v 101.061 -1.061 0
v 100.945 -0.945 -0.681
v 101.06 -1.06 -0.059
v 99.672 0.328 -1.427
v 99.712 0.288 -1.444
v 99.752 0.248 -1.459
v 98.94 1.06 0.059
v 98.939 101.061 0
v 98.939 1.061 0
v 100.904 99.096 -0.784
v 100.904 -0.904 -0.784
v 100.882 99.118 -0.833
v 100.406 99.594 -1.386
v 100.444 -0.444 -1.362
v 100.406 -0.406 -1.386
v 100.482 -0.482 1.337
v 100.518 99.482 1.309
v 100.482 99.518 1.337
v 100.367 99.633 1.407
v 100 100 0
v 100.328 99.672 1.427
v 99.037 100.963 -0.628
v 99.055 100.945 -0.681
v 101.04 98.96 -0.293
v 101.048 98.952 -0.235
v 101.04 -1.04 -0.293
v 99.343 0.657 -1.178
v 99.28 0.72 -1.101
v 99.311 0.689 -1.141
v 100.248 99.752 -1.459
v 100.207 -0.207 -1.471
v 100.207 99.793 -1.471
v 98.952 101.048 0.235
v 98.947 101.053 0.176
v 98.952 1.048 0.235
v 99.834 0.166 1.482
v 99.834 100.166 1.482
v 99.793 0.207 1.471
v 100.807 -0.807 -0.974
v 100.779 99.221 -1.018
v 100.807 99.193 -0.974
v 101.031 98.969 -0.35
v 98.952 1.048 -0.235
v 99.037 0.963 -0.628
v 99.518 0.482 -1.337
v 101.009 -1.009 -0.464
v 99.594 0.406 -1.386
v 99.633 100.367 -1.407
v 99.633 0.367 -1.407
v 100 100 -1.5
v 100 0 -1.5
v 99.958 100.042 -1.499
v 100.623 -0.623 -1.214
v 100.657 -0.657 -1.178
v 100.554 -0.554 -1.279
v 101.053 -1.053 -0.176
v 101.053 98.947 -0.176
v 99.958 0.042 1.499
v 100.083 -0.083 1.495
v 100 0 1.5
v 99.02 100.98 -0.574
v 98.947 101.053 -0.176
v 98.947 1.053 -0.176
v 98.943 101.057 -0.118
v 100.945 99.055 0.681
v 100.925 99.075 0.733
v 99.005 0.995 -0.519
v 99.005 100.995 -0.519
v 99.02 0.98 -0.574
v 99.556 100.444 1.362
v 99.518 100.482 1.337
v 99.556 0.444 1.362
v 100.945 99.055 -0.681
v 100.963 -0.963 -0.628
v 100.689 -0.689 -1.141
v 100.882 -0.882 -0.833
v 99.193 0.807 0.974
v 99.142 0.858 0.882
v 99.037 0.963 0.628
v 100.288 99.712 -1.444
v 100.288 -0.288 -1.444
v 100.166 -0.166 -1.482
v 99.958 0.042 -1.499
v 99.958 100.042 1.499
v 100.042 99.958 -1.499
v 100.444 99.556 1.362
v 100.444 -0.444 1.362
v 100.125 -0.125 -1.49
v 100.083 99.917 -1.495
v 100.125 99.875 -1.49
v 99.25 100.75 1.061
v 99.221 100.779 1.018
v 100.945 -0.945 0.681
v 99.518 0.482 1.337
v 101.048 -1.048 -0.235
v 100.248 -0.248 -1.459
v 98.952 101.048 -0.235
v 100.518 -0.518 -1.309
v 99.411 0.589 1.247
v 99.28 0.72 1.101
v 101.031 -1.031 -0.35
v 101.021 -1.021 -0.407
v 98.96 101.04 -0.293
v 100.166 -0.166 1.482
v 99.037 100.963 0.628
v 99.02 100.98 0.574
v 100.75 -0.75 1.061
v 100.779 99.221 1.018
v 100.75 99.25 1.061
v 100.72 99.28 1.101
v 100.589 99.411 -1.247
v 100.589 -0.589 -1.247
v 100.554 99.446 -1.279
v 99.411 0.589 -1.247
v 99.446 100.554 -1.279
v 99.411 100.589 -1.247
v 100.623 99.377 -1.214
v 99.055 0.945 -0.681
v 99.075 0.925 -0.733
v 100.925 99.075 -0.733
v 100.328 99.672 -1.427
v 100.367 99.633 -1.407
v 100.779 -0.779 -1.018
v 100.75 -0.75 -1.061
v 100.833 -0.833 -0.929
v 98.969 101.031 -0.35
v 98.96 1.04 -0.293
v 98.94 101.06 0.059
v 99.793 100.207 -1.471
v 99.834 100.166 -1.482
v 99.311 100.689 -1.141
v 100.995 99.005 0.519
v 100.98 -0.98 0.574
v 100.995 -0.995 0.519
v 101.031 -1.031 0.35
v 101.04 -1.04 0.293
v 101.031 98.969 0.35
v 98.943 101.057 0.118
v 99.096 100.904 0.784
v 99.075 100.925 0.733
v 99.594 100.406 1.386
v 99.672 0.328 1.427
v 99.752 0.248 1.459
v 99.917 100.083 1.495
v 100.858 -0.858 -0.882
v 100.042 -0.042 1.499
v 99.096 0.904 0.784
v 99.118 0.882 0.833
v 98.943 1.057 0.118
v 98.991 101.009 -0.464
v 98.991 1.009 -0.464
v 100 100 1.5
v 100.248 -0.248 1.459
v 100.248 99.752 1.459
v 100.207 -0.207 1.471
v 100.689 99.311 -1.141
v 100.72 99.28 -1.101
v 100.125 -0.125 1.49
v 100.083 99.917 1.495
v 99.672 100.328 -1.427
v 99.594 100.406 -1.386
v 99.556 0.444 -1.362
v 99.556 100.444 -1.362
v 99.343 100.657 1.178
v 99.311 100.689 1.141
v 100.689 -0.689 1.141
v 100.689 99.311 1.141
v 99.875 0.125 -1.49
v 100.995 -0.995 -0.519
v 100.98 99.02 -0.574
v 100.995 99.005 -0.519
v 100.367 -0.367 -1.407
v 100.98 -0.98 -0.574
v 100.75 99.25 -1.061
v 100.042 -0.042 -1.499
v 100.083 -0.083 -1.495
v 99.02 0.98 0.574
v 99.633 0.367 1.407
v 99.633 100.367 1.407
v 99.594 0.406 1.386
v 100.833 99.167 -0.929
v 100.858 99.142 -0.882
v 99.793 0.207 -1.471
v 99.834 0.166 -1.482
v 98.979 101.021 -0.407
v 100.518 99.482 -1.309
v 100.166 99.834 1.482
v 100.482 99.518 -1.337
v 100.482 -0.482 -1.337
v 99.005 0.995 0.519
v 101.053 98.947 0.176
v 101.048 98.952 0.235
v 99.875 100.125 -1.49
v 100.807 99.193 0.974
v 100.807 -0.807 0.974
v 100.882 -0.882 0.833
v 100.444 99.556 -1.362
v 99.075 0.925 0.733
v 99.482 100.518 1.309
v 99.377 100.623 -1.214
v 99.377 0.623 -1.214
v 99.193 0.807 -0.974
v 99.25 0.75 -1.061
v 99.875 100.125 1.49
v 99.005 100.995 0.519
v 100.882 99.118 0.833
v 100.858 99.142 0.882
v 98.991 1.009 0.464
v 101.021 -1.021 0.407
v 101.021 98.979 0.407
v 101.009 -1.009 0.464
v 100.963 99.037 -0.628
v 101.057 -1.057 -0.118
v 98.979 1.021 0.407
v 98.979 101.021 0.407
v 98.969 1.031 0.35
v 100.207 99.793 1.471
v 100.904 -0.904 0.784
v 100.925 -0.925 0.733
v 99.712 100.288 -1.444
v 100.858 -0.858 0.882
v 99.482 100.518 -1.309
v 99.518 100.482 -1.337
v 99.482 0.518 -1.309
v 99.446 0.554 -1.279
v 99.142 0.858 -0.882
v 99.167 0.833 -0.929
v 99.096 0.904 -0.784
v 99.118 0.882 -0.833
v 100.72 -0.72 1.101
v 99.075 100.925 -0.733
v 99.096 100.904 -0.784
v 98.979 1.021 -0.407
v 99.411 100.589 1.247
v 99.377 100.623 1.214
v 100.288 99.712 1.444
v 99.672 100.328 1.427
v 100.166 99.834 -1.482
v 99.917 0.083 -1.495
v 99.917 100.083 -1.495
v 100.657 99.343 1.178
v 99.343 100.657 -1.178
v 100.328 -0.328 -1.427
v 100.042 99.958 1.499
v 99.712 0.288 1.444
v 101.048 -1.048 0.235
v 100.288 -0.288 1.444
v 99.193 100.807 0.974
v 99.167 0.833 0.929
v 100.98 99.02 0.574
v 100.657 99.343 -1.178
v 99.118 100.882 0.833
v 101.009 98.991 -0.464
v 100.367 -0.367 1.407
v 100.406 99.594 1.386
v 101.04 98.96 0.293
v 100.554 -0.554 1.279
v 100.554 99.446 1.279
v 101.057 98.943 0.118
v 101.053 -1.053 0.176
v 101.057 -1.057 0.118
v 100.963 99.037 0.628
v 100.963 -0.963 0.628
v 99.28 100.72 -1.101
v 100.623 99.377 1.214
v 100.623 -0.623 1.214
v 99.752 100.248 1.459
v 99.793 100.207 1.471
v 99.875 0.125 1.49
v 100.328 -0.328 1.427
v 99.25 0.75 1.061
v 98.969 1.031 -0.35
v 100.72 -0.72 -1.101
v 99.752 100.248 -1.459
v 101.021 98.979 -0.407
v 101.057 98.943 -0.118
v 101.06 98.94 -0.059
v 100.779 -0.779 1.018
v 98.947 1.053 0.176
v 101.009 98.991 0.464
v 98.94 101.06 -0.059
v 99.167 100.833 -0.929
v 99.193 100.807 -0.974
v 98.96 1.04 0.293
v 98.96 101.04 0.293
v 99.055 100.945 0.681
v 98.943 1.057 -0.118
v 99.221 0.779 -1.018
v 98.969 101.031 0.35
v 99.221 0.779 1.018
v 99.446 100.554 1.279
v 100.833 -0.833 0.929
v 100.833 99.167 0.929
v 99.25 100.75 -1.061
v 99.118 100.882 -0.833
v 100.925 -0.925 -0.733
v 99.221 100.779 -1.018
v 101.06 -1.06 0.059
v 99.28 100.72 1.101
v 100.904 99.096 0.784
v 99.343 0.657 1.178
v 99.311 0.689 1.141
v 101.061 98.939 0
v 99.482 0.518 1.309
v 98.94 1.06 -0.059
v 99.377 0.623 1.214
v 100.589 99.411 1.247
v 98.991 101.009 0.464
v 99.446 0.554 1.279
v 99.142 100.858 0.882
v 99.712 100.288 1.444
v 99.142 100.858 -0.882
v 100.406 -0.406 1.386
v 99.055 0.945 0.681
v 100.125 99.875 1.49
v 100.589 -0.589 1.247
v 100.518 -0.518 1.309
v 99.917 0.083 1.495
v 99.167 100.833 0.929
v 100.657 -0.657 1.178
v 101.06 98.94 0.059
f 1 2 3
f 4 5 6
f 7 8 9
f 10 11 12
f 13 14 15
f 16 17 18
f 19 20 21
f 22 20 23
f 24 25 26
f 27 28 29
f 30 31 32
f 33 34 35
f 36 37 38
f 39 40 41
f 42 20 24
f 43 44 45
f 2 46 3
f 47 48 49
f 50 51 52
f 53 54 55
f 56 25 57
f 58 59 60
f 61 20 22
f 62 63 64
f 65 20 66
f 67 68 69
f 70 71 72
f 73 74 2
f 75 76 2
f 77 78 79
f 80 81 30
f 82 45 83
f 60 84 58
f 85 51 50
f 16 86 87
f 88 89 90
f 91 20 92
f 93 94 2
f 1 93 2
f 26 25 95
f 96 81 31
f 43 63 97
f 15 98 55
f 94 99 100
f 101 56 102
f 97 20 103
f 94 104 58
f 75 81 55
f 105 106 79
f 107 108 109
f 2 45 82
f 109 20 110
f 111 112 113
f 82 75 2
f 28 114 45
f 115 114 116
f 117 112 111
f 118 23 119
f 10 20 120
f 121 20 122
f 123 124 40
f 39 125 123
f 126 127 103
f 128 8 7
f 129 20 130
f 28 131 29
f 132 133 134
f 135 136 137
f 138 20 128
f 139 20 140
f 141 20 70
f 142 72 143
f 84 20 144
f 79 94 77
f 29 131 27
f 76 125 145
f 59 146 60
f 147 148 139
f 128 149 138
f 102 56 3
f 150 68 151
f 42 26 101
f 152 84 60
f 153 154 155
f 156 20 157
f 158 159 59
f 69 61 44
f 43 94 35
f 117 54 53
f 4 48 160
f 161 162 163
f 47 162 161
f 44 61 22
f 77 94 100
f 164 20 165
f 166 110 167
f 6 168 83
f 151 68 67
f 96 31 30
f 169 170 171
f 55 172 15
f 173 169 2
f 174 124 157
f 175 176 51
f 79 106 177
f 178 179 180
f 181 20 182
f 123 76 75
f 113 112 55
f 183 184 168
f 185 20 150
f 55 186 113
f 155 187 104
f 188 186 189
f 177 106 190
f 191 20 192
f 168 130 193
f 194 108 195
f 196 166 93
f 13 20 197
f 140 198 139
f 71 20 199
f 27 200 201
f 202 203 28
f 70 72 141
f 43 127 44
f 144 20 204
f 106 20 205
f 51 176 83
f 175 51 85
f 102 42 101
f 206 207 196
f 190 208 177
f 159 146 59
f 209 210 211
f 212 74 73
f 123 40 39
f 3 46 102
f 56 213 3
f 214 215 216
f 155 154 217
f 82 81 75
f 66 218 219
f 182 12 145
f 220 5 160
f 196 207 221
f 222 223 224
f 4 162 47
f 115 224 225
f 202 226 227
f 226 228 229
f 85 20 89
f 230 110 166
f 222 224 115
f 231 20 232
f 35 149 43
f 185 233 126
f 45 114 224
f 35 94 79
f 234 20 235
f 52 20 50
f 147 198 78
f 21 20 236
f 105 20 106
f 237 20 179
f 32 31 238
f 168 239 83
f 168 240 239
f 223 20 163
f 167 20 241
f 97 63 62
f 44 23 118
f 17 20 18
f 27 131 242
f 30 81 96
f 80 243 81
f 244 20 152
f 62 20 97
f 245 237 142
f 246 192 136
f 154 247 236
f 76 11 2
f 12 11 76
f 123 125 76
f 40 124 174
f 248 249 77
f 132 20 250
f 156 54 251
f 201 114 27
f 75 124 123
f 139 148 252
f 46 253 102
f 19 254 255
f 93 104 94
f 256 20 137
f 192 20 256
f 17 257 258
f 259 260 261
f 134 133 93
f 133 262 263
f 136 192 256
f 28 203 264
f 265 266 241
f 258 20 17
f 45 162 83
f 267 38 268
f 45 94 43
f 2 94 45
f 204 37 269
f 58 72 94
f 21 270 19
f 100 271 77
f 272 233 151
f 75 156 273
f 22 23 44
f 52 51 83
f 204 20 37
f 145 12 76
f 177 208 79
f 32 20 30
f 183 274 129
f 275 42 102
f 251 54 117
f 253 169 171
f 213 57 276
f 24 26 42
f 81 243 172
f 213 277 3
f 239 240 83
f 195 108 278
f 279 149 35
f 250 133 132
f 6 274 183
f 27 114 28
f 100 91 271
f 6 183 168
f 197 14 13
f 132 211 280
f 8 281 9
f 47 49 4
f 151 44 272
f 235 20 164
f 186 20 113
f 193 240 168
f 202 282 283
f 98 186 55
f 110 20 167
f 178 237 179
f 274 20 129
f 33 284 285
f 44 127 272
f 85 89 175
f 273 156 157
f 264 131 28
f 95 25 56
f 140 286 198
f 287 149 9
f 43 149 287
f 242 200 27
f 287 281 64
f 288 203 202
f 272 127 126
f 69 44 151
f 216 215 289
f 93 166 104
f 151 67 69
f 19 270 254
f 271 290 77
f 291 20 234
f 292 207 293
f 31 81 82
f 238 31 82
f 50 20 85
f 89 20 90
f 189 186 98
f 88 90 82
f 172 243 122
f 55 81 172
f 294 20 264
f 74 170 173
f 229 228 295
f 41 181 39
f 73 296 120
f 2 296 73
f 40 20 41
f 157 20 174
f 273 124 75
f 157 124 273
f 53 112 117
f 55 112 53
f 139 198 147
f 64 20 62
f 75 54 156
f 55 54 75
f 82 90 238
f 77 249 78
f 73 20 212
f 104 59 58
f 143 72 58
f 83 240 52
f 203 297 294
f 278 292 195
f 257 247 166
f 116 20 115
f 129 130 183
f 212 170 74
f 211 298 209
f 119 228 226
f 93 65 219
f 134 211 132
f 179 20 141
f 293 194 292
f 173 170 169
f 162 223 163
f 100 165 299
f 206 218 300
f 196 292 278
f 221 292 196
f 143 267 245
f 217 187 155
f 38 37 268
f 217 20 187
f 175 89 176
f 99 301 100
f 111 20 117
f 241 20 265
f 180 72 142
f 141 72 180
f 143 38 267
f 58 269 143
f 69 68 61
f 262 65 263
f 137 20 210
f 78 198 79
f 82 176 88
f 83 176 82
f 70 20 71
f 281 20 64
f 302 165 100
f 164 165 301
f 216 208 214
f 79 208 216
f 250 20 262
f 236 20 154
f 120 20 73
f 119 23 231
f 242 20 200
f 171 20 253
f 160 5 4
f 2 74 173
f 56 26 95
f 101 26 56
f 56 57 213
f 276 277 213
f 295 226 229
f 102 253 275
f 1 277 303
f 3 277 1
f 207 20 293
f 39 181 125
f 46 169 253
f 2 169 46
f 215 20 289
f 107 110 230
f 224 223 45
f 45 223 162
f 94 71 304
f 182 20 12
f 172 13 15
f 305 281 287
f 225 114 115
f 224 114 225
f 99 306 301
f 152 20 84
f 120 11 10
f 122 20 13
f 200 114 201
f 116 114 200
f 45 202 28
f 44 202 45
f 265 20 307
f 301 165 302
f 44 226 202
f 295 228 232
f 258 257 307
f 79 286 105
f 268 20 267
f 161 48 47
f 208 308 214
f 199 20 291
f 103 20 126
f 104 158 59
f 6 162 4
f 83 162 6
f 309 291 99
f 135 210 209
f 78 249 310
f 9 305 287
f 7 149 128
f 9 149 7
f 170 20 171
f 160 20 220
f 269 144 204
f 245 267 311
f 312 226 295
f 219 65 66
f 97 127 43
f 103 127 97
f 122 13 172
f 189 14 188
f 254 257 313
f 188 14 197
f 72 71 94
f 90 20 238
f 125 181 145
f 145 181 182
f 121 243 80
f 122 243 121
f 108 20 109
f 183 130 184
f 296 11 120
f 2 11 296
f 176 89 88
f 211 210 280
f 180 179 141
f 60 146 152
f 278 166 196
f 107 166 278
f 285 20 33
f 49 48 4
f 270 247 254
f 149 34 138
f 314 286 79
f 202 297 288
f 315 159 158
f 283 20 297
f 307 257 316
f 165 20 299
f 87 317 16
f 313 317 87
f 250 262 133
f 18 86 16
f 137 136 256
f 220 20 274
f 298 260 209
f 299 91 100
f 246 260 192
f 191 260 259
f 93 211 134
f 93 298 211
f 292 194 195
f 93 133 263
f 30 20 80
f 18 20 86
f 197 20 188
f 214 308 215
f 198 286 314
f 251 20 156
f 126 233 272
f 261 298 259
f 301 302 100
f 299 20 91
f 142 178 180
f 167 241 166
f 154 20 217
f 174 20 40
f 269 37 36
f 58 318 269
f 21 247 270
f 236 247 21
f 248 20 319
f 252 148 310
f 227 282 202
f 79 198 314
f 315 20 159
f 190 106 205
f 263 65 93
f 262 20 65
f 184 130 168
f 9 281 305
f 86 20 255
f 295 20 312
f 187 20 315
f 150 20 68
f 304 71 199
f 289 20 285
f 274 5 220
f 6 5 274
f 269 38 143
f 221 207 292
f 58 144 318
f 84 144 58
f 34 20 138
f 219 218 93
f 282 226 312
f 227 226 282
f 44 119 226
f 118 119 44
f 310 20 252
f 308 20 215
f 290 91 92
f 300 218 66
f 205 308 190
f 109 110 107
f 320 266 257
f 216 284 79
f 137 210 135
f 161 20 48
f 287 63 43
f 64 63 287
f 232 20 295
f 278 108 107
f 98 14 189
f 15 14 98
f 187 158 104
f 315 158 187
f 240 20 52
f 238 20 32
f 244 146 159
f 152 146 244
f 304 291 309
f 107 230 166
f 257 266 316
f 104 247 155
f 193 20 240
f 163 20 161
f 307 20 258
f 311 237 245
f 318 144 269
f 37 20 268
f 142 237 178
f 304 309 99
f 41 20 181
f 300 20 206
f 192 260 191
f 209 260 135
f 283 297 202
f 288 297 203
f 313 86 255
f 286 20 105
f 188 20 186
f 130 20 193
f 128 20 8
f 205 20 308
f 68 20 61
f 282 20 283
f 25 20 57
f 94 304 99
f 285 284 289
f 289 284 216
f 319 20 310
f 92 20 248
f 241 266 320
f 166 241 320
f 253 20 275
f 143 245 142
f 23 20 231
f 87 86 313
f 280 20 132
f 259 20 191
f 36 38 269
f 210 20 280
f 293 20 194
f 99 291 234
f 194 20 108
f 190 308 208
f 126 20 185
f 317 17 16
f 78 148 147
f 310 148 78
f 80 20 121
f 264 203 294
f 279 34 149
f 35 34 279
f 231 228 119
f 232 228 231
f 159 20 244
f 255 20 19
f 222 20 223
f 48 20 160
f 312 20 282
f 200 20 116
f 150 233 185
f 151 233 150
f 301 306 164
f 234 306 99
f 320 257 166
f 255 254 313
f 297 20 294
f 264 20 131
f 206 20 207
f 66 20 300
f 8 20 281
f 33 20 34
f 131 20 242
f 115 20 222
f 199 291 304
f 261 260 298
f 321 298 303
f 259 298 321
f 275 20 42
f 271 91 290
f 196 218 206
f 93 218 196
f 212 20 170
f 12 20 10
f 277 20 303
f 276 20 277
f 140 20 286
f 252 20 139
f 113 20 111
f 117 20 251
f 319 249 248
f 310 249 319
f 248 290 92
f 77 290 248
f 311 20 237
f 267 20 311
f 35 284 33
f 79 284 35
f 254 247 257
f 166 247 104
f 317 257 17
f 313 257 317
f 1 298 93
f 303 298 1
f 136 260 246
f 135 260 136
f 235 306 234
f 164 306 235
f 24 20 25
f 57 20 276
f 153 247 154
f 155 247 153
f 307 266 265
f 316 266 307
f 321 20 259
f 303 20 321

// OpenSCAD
// file: syms.scad
module symY(t) {
    translate(t)
        children();
    mirror([0,1,0])
        translate(t)
            children();
}
module symX(t) {
    translate(t)
        children();
    mirror([1,0,0])
        translate(t)
            children();
}

module symZ(t) {
    translate(t)
        children();
    mirror([0,0,1])
        translate(t)
            children();
}

module	symXY(t) {
	tx=t[0];
	ty=t[1];
	tz=t[2];
	symX([tx,0,0])
	symY([0,ty,tz])
		children();
}
// main file
use <syms.scad>

mode="defc";
render=(mode=="def") && false;


eps=1e-4;
$fn=render ? 16 : 4;   // line detail
M=100;  // object scale
N=M/(50/8)/2;   // number of lines
S=render ? 4*N : 4*N;   // line detail

W=3;

module mySphere() {
    color([1,0,0])
    sphere(d=W);
}


// maps 0:1 to 0:1 but with more detail near 0 and 1
function s(v) = (cos(v*180+180)+1)/2;

// maps 2d points onto a "hill" alike thing; also distorts y a little bit
function f(v) = ([
    v[0],v[1]+pow((1-v[0]*v[0])*v[1],1),
    pow((1-v[0]*v[0])*v[1],.25)
] );


// calculates a vector in the given dir (0=x axis)
function v3r(d) = [ cos(d), sin(d), 0 ];

// maps points to a non-perpicular axis position
function g(v3) = 
 v3 *[ v3r(0),
  v3r(90),
  [ 0,0,1]
]* M;

module cx(a,b,D) {
    for(i=[0:1:S-1]) {
        x=s((i+0.0)/S);
        y=s((i+1.0)/S);
        hull() {
            translate(g(f(x*a+(1-x)*b),D))
            children();
            translate(g(f(y*a+(1-y)*b),D))
            children();
        }
    }
}

module dx(u0,u1,v0,v1,n,D,Q) {
    for(i=[0:n]) {
        j=(n-i);
        cx(u0*j/n+u1*i/n, v0*i/n+v1*j/n+Q,D) {
                mySphere();
        }

    }
}

module fx(n,m) {
    u0=[-1,0,0];
    u1=[1,0,0];
    v0=[0,0,0];
    v1=[0,1,0];

    for(i=[0:n]) {
        j=(n-i);
        z=u0*i/n+u1*j/n;
        cx(z+v0,z+v1,[0,90]) {
                mySphere();
        }
    }
    
    for(i=[0:m]) {
        j=(m-i);
        z=v0*i/m+v1*j/m;
        cx(z+u0,z+u1,[0,90]) {
                mySphere();
        }
    }
    
}

//fx(2*N,2*N);




K=5;

module foot() {
    hull() {
        R=K/M;
        translate(g([-1,0,0]))
            mySphere();
        translate(g([-1,R,0]))
            mySphere();
        translate(g([1,0,0]))
            mySphere();
        translate(g([1,R,0]))
            mySphere();
    }

    symX()
    hull() {
        R=K/M;
        translate(g([-1,1,0]))
            mySphere();
        translate(g([-1,0,0]))
            mySphere();
        translate(g([-1+R,1,0]))
            mySphere();
        translate(g([-1+R,0,0]))
            mySphere();
    }
}

//echo(g(f([0,1,0])));



//foot();


a=[ g([0,0,0]), g([1,0,0]),g([1,1,0]), g([2,1,0]) ];

function unit(v) = norm(v)>0 ? v/norm(v) : undef; 

function transpose(m) = // m is any rectangular matrix of objects
  [ for(j=[0:len(m[0])-1]) [ for(i=[0:len(m)-1]) m[i][j] ] ];

function m33tom44(m,p=[0,0,0]) = [
    concat(m[0], p[0]),
    concat(m[1], p[1]),
    concat(m[2], p[2]),
    [0,0,0,1],
];
// "invents" a matrix for which the given axis is the Z axis
function buildMatForZ(z) = [
    unit(cross(z,[0,0,1])),
    unit(cross(z,cross(z,[0,0,1]))),
    unit(z)
];


function computePointMatrix(p0,p1,p2) =
    m33tom44(transpose(buildMatForZ(p2-p0)),p1);

// 4 point cylinder line
module showPiece(p) {
    d1=p[2]-p[0];
    d2=p[3]-p[1];
    k1=m33tom44(transpose(buildMatForZ(d1/norm(d1))),p[1]);
    k2=m33tom44(transpose(buildMatForZ(d2/norm(d2))),p[2]);
    hull() {
        multmatrix(k1)
            cylinder(h=eps,d1=W,d2=0);
        multmatrix(k2)
            cylinder(h=eps,d1=W,d2=0);
    }
}
$fn=160;

showPiece(a);
